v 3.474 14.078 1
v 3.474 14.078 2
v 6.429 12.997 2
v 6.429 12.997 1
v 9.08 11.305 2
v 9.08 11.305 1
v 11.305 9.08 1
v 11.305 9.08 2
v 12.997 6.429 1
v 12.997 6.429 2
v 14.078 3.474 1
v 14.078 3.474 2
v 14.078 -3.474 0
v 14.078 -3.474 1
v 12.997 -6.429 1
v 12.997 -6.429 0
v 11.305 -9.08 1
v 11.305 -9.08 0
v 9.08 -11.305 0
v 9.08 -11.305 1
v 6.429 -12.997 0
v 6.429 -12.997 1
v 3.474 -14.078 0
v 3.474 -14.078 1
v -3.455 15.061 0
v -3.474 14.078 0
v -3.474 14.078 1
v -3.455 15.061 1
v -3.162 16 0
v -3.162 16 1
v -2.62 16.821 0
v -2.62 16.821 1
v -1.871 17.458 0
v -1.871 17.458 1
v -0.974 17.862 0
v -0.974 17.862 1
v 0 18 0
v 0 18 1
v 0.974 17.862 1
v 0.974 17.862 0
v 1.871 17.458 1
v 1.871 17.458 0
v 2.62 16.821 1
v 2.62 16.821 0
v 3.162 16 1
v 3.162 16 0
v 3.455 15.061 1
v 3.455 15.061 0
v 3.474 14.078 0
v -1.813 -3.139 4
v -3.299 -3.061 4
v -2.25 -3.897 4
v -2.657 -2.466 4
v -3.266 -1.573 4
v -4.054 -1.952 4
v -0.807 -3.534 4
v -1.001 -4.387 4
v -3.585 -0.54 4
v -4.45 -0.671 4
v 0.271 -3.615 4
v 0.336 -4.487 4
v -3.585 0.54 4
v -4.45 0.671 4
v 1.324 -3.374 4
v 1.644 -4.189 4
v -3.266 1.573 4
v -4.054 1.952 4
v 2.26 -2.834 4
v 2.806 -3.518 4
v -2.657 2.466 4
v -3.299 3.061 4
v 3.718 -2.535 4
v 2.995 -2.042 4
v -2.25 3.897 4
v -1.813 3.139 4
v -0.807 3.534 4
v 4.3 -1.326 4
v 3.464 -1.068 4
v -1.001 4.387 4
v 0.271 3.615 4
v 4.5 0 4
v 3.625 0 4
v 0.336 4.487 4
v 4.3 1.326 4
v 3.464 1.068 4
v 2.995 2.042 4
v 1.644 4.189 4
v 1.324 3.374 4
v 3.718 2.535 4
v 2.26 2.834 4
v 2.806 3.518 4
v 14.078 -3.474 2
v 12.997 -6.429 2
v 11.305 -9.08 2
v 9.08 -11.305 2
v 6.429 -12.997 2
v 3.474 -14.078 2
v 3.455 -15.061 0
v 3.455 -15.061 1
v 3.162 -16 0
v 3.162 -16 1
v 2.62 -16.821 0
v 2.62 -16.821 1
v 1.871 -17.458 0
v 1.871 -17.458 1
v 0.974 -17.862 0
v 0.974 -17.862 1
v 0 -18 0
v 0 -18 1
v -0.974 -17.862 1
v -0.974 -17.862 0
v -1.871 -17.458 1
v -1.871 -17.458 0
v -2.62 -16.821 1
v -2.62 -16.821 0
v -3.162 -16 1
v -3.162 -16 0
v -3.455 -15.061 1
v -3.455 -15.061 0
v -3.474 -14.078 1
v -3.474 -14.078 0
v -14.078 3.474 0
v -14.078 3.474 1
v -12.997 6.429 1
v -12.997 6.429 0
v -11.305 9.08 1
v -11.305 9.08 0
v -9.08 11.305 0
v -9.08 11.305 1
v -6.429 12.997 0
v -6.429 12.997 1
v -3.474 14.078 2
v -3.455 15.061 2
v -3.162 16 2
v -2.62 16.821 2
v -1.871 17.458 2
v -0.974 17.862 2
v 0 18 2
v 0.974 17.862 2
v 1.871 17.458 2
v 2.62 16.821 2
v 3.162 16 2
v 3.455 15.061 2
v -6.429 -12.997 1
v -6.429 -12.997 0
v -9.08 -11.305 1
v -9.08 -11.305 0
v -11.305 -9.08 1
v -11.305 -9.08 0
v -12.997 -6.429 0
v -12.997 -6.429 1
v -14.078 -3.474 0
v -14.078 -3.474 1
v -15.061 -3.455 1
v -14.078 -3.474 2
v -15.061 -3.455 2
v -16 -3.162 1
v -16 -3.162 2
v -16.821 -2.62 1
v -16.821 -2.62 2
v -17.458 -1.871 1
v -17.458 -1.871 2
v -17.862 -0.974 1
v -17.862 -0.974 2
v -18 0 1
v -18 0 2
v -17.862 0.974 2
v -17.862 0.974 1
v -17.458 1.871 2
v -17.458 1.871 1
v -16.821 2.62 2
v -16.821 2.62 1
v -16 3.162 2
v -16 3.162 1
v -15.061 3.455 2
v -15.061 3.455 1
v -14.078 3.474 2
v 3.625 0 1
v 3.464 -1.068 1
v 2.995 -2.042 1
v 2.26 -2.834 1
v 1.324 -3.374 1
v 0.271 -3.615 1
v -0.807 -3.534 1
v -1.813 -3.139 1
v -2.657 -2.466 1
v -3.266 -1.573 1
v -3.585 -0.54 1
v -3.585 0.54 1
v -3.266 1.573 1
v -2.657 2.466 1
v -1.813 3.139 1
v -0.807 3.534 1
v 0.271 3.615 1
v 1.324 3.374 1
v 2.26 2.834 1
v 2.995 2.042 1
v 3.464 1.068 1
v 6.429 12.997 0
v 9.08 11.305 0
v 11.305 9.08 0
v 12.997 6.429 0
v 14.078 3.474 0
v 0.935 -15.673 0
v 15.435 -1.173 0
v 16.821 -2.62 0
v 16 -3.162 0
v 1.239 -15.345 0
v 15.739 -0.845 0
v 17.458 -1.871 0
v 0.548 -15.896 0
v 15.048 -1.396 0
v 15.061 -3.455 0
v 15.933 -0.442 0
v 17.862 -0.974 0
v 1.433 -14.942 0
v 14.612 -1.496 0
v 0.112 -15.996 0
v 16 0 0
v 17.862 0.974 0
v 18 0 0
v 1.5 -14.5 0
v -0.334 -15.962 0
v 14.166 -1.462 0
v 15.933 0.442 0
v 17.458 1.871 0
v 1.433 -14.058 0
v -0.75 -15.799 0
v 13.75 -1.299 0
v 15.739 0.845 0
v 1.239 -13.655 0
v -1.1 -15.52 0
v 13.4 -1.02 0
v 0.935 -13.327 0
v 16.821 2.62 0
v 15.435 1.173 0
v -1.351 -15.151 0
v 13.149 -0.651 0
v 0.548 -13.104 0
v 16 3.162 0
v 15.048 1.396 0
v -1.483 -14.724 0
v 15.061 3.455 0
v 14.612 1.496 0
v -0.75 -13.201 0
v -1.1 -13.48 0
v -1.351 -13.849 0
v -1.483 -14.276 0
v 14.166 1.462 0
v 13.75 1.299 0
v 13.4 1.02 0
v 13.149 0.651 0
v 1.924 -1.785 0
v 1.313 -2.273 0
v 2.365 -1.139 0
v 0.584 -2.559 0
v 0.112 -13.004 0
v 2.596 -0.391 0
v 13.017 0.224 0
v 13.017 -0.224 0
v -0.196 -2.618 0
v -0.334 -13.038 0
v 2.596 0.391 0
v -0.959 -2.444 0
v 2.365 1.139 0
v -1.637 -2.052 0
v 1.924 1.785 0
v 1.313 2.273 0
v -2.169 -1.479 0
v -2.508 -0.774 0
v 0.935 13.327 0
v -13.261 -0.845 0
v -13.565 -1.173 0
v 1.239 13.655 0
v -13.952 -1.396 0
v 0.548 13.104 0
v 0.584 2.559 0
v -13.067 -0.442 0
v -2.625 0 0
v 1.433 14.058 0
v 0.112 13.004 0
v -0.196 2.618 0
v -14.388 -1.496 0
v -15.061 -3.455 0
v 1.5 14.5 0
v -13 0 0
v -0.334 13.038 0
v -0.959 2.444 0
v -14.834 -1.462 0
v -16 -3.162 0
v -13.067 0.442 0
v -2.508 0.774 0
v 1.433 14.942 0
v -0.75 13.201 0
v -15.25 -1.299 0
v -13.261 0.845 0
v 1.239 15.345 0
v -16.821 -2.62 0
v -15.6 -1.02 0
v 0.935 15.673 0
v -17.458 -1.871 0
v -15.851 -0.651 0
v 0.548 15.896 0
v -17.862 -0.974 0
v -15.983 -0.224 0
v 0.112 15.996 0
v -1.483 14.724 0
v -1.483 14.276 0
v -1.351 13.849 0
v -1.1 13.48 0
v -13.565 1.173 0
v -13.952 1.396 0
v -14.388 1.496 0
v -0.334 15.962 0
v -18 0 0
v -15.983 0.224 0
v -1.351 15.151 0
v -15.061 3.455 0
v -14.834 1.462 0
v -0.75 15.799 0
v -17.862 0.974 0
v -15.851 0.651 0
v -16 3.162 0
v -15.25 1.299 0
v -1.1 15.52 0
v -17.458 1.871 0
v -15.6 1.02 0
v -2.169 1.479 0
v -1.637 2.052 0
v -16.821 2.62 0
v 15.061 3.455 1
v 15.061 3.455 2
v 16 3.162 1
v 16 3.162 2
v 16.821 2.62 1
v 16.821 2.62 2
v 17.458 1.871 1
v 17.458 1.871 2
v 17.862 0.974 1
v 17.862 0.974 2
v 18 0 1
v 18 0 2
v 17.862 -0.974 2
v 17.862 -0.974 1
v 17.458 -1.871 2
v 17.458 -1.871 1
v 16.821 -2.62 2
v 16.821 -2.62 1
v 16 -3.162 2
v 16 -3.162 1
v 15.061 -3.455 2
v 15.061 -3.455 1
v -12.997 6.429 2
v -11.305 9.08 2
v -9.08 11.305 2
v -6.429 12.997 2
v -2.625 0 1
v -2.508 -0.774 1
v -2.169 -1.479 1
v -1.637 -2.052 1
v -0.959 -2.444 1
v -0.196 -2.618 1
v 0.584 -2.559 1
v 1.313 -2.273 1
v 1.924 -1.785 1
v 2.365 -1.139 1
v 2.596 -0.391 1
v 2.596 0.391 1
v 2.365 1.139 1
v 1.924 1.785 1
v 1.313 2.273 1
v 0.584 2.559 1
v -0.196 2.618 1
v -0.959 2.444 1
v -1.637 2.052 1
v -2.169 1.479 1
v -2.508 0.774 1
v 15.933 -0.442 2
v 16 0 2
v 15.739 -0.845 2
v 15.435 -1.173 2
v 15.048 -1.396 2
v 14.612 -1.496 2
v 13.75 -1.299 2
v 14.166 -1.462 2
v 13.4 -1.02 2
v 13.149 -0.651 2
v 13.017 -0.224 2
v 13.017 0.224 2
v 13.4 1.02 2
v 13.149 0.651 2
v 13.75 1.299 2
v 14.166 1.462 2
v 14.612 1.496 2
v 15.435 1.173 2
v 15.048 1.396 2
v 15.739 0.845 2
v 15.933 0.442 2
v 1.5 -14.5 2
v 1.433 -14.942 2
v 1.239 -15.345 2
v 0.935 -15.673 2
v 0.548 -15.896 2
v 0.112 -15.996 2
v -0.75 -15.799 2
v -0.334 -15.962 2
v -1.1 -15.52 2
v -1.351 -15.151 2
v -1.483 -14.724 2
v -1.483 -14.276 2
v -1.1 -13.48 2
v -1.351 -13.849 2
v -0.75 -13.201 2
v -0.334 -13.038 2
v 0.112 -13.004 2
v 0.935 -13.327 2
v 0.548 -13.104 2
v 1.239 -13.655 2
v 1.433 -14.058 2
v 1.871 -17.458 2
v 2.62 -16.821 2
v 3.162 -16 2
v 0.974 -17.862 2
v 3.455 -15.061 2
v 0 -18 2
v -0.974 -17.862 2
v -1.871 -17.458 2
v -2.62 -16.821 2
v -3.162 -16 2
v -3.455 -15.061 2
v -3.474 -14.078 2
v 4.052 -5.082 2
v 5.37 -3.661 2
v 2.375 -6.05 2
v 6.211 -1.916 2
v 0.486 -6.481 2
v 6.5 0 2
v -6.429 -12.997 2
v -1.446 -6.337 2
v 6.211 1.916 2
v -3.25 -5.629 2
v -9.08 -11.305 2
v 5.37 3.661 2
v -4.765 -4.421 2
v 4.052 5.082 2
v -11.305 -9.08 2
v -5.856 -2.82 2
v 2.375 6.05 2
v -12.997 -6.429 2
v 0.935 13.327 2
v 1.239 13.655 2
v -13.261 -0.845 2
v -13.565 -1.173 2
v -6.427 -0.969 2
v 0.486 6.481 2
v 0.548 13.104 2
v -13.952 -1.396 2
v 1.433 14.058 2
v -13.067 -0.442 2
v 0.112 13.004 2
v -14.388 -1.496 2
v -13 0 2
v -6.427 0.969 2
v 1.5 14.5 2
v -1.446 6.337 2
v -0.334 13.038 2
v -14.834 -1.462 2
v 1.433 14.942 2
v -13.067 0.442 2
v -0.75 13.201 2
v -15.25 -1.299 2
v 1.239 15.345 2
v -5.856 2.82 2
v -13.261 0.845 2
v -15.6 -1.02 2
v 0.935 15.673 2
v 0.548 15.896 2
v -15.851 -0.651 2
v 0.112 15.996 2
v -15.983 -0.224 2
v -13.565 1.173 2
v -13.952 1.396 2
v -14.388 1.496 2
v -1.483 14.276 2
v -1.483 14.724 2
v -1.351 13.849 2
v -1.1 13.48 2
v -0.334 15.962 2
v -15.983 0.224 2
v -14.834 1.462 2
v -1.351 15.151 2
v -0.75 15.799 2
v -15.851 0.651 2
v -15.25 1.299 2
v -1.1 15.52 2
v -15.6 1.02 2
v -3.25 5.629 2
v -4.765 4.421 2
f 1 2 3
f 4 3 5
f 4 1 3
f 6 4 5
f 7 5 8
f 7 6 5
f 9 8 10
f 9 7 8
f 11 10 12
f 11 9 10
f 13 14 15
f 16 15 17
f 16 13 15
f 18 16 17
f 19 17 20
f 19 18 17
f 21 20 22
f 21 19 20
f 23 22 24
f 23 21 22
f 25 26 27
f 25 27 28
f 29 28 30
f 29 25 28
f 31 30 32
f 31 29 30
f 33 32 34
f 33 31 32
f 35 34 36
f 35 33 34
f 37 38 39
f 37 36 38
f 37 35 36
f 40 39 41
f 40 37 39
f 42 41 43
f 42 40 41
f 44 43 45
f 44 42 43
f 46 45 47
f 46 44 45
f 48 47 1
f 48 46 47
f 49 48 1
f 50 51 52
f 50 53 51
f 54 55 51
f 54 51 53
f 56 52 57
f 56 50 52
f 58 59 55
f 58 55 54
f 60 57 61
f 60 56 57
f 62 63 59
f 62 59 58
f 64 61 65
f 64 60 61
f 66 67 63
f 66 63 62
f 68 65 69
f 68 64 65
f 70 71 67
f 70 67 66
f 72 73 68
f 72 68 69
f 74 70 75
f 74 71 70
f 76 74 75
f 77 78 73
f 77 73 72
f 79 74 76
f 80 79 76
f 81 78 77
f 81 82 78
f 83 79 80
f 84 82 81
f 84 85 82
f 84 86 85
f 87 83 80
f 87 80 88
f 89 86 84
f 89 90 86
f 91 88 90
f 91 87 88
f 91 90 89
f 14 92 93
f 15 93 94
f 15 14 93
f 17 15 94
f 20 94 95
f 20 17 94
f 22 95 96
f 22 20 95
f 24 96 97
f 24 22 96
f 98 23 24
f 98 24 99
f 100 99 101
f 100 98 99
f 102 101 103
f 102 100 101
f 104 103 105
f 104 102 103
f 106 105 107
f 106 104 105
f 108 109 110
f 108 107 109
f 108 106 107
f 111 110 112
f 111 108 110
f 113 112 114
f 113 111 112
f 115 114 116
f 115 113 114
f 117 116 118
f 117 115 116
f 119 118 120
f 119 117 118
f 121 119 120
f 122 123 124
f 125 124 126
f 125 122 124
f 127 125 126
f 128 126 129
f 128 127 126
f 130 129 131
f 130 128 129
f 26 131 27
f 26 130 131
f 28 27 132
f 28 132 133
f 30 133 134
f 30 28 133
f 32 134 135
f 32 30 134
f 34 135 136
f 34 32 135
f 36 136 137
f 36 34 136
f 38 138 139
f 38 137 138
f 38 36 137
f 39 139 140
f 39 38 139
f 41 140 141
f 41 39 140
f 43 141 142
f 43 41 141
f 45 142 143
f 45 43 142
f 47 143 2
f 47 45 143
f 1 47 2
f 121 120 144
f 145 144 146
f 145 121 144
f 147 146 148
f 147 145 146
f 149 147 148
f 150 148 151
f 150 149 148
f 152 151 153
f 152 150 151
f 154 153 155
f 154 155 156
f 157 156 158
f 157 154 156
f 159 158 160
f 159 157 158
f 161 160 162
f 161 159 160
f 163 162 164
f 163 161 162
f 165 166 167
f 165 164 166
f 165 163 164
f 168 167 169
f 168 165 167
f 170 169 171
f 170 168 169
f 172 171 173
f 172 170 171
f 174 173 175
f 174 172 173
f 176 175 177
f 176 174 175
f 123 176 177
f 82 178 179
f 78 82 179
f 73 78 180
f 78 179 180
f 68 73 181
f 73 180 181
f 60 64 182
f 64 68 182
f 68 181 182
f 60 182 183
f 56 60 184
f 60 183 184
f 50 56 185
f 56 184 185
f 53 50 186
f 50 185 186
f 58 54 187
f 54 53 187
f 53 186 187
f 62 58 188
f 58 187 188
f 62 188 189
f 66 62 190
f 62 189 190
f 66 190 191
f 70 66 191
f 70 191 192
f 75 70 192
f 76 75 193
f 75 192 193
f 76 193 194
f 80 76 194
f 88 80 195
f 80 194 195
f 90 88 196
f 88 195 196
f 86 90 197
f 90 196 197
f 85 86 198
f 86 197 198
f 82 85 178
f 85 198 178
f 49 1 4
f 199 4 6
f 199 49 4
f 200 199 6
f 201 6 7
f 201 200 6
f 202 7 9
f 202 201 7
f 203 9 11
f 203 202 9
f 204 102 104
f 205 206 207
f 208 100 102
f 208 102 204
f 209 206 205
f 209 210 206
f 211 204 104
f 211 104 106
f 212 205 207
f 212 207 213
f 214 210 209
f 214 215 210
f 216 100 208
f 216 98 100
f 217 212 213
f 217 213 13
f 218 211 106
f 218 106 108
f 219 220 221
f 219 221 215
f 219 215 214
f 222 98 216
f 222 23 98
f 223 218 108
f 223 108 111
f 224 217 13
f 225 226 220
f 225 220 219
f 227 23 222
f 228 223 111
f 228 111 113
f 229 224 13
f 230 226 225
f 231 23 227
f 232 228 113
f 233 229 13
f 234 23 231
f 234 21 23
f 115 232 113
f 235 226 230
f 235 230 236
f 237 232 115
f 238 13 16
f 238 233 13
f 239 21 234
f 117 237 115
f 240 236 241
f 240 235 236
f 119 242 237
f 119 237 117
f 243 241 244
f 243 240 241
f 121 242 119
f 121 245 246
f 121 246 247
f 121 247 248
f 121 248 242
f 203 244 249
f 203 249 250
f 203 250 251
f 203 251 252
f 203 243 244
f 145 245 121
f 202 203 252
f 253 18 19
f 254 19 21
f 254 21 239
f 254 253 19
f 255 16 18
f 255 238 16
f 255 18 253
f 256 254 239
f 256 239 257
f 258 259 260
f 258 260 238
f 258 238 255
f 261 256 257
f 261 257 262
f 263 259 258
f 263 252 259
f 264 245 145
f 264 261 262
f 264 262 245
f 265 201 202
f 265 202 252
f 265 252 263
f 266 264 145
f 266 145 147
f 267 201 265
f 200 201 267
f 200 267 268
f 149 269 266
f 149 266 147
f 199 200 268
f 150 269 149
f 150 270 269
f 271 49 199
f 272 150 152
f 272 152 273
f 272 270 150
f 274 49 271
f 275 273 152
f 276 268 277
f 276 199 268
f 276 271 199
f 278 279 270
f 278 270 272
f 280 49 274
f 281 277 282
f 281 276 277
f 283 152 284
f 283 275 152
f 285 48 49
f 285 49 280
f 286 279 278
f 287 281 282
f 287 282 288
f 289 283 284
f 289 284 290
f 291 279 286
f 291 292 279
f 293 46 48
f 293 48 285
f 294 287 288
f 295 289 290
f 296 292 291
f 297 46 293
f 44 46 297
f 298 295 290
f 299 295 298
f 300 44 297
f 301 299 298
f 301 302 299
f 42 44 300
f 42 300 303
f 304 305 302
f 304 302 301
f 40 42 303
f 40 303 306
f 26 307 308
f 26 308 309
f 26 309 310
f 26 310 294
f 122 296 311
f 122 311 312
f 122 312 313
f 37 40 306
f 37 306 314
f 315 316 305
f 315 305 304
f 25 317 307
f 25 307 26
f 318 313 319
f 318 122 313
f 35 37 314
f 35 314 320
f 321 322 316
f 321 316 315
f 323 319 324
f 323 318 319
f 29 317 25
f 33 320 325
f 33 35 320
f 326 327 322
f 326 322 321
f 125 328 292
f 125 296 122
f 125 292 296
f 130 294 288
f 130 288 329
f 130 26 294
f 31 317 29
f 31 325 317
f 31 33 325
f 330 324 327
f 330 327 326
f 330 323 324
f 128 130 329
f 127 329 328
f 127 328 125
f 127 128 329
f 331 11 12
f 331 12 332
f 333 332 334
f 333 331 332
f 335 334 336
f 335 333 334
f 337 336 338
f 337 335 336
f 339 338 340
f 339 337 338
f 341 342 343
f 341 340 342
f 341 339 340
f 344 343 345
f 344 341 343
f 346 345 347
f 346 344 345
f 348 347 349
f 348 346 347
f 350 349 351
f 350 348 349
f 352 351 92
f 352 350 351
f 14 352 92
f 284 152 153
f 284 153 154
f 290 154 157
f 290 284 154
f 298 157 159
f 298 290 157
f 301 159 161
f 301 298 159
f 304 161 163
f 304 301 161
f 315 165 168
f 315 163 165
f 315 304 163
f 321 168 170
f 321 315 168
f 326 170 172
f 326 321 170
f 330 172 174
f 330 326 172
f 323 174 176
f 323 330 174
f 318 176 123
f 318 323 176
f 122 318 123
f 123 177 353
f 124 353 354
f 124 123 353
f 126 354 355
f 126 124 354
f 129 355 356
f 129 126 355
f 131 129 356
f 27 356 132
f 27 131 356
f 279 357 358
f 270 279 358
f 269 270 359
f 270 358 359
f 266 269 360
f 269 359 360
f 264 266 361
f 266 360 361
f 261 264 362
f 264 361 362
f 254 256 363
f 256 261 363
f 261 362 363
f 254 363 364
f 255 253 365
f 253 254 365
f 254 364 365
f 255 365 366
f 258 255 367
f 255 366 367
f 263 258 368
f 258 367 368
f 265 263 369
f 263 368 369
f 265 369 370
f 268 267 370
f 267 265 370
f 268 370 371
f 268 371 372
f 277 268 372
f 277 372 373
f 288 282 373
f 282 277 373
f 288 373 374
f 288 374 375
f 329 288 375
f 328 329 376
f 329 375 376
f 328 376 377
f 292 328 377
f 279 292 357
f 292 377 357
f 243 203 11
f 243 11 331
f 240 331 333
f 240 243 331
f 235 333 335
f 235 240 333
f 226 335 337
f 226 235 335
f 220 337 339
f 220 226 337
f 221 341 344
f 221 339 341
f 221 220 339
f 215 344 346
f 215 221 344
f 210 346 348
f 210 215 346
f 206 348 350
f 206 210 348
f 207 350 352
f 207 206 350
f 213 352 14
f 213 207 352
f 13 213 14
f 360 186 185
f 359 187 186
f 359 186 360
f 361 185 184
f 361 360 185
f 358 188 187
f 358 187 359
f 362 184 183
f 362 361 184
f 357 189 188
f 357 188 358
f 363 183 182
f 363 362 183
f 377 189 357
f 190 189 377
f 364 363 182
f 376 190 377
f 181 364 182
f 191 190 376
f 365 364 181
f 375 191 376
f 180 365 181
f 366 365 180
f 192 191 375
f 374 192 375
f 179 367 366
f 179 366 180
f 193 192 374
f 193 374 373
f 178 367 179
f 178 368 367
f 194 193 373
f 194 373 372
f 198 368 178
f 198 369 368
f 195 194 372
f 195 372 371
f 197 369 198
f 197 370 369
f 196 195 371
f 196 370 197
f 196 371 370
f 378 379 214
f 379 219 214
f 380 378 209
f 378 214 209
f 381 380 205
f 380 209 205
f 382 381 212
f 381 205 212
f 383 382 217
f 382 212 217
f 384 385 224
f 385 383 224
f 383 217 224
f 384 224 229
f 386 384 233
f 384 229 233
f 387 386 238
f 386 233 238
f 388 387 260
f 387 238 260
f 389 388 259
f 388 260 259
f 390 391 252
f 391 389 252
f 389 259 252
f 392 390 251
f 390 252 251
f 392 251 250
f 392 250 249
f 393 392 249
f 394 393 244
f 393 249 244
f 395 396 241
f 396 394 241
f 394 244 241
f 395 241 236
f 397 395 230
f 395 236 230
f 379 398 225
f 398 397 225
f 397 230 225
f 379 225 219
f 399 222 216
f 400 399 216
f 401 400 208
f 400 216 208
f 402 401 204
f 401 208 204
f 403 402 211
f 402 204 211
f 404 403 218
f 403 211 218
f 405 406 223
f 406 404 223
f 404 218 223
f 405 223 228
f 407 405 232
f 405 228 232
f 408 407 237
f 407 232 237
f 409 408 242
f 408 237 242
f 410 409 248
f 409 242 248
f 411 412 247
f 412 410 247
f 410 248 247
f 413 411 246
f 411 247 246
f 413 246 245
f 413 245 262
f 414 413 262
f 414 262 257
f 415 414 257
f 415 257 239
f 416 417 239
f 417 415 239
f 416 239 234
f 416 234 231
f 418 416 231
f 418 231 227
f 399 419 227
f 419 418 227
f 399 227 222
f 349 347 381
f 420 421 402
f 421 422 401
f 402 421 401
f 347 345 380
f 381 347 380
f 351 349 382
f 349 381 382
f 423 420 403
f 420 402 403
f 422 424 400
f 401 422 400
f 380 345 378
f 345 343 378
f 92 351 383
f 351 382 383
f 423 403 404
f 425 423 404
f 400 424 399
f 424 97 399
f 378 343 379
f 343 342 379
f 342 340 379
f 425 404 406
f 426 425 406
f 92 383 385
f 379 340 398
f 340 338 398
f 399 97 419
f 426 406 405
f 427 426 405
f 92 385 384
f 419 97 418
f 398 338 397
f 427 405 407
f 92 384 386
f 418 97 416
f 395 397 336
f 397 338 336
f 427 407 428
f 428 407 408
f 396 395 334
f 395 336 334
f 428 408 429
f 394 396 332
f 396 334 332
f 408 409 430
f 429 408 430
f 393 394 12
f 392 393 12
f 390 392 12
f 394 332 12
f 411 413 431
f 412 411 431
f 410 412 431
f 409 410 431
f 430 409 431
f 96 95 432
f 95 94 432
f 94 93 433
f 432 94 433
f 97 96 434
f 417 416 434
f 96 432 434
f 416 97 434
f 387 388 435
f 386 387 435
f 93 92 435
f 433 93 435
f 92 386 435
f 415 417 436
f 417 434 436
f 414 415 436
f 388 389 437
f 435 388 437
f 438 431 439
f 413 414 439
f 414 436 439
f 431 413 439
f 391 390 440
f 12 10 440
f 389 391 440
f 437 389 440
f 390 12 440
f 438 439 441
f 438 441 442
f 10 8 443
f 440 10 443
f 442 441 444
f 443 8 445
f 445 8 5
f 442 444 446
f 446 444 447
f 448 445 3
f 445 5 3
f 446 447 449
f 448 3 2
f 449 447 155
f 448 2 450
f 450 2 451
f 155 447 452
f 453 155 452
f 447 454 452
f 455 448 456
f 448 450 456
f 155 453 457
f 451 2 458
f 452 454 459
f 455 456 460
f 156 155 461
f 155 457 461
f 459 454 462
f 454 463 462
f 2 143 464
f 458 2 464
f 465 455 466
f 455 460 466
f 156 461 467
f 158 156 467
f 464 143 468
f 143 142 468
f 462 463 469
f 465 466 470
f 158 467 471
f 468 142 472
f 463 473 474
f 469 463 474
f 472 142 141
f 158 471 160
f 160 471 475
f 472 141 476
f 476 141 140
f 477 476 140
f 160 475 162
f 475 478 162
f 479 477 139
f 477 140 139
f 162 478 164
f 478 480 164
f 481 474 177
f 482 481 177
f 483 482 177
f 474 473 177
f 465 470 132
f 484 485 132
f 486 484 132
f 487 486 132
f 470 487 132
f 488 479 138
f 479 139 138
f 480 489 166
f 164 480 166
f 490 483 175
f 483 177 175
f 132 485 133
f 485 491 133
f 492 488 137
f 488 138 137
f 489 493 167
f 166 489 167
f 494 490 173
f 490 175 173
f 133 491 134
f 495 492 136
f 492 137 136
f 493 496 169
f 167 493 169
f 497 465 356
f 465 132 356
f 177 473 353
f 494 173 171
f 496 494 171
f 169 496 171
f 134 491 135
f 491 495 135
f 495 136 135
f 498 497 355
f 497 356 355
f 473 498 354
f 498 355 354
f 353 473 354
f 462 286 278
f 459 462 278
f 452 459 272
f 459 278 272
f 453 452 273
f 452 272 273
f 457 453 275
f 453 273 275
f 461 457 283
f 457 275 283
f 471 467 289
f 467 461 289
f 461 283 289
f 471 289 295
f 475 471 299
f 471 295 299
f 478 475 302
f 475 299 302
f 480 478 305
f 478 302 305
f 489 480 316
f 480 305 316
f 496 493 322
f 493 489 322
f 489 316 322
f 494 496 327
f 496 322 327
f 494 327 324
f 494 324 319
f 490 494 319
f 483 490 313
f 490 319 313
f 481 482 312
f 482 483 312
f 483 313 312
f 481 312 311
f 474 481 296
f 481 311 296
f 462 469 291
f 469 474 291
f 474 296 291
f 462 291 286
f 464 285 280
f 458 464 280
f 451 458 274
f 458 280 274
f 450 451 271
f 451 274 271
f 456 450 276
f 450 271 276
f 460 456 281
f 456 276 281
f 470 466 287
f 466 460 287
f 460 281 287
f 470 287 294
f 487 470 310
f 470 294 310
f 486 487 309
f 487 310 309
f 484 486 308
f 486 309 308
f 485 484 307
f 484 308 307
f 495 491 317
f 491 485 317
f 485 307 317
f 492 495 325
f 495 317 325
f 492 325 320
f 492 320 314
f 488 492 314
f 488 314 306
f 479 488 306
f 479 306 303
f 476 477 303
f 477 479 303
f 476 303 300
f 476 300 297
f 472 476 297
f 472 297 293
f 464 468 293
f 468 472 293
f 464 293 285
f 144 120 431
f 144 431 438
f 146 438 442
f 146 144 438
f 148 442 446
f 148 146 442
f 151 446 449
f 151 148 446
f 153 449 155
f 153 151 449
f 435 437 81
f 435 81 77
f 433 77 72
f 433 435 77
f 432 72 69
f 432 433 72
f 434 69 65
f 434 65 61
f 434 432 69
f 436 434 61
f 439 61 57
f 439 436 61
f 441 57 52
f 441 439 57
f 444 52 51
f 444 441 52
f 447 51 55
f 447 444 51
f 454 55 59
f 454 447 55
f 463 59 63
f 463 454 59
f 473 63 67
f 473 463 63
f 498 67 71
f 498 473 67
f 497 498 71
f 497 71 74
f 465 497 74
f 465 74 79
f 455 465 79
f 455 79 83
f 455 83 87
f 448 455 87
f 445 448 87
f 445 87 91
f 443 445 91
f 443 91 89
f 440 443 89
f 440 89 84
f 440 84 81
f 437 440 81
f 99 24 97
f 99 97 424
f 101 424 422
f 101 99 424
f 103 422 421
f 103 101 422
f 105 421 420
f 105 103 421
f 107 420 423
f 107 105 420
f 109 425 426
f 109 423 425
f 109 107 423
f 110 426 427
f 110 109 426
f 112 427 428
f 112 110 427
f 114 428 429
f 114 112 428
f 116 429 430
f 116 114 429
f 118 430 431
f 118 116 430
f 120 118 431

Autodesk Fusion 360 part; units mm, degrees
sketch "Sketch1" plane through (0, 0, 0) normal (0, 0, 1) x (1, 0, 0)
  circle A0 centre (0, 0) radius 11
  circle A1 centre (0, 0) radius 12.5
  circle A2 centre (0, 0) radius 14.5
  line L0 (0, 0) -> (0, 14.5)
  line L1 (0, 0) -> (14.5, 0)
  line L2 (0, 0) -> (-14.5, 0)
  line L3 (0, 0) -> (0, -14.5)
  circle A3 centre (0, 14.5) radius 3.5
  circle A4 centre (14.5, 0) radius 3.5
  circle A5 centre (0, -14.5) radius 3.5
  circle A6 centre (-14.5, 0) radius 3.5
  circle A7 centre (-14.5, 0) radius 1.5
  circle A8 centre (0, 14.5) radius 1.5
  circle A9 centre (14.5, 0) radius 1.5
  circle A10 centre (0, -14.5) radius 1.5
  dimension "d1" = 22
  dimension "d2" = 25
  dimension "d3" = 29
  dimension "d4" = 7
  dimension "d5" = 3
  dimension "d6" = 3
  dimension "d7" = 3
  dimension "d8" = 3
extrude "Extrude1" add sketch "Sketch1" along normal blind 1 contours A0 A1 A4 A5 | A1 L1 A4 | A0 A1 A3 A4 | A1 L1 A4 | A1 L0 A3 | A0 A1 A3 A6 | A1 L0 A3 | A0 A1 A5 A6 | A1 L3 A5 | A1 L3 A5 | A1 A2 L1 A4 A9 | A1 A2 L1 A4 A9 | A1 A2 A3 A4 | A1 A2 A4 A5 | A1 L2 A6 | A1 L2 A6 | A1 A2 L0 A3 A8 | A1 A2 L0 A3 A8 | A1 A2 A3 A6 | A1 A2 L3 A5 A10 | A1 A2 L3 A5 A10 | A1 A2 A5 A6 | A2 A4 A9 | A1 A2 L2 A6 A7 | A1 A2 L2 A6 A7 | A2 A3 A8 | A2 A5 A10 | A2 A6 A7
sketch "Sketch2" plane through (0, 0, 1) normal (0, 0, 1) x (1, 0, 0)
  circle A0 centre (0, -14.5) radius 1.5
  circle A1 centre (14.5, 0) radius 1.5
  circle A2 centre (-14.5, 0) radius 1.5
  circle A3 centre (0, 14.5) radius 1.5
  circle A4 centre (0, 0) radius 11
  arc A5 (-3.4744, 14.0776) -> (-14.0776, 3.4744) centre (0, 0) ccw
  arc A6 (-14.0776, 3.4744) -> (-14.0776, -3.4744) centre (-14.5, 0) ccw
  arc A7 (-14.0776, -3.4744) -> (-3.4744, -14.0776) centre (0, 0) ccw
  arc A8 (-3.4744, -14.0776) -> (3.4744, -14.0776) centre (0, -14.5) ccw
  arc A9 (3.4744, -14.0776) -> (14.0776, -3.4744) centre (0, 0) ccw
  arc A10 (14.0776, -3.4744) -> (14.0776, 3.4744) centre (14.5, 0) ccw
  arc A11 (14.0776, 3.4744) -> (3.4744, 14.0776) centre (0, 0) ccw
  arc A12 (3.4744, 14.0776) -> (-3.4744, 14.0776) centre (0, 14.5) ccw
  circle A13 centre (0, 0) radius 11
  circle A14 centre (0, 0) radius 12.375
  circle A15 centre (0, 0) radius 14.5
  circle A16 centre (0, 14.5) radius 3.5
  circle A17 centre (14.5, 0) radius 3.5
  circle A18 centre (0, -14.5) radius 3.5
  circle A19 centre (-14.5, 0) radius 3.5
  dimension "d11" = 24.75
extrude "Extrude2" add sketch "Sketch2" along normal blind 1.25 contours A0 A8 A15 A18 | A0 A14 A15 A18 | A9 A14 A15 A17 A18 | A7 A14 A15 A18 A19 | A1 A10 A15 A17 | A1 A14 A15 A17 | A2 A6 A15 A19 | A2 A14 A15 A19 | A5 A14 A15 A16 A19 | A11 A14 A15 A16 A17 | A3 A12 A15 A16 | A3 A14 A15 A16
extrude "Extrude3" cut 1 faces at (-2.5265, -13.3305, 2.25) along direction (0, 0, -1) blind 1.25
sketch "Sketch3" plane through (0, 0, 1) normal (0, 0, 1) x (1, 0, 0)
  arc A0 (-3.4744, 14.0776) -> (-14.0776, 3.4744) centre (0, 0) ccw
  arc A1 (-14.0776, 3.4744) -> (-14.0776, -3.4744) centre (-14.5, 0) ccw
  arc A2 (-14.0776, -3.4744) -> (-3.4744, -14.0776) centre (0, 0) ccw
  arc A3 (-3.4744, -14.0776) -> (3.4744, -14.0776) centre (0, -14.5) ccw
  arc A4 (3.4744, -14.0776) -> (14.0776, -3.4744) centre (0, 0) ccw
  arc A5 (14.0776, -3.4744) -> (14.0776, 3.4744) centre (14.5, 0) ccw
  arc A6 (14.0776, 3.4744) -> (3.4744, 14.0776) centre (0, 0) ccw
  arc A7 (3.4744, 14.0776) -> (-3.4744, 14.0776) centre (0, 14.5) ccw
  circle A8 centre (0, 14.5) radius 1.5
  circle A9 centre (14.5, 0) radius 1.5
  circle A10 centre (-14.5, 0) radius 1.5
  circle A11 centre (0, -14.5) radius 1.5
  circle A12 centre (0, 0) radius 11
  circle A13 centre (0, 0) radius 3.05
  dimension "d16" = 6.1
extrude "Extrude4" add sketch "Sketch3" along normal blind 2 contours A0 A1 A2 A3 A4 A5 A6 A7 | A12
sketch "Sketch4" plane through (0, 0, 3) normal (0, 0, 1) x (1, 0, 0)
  circle A0 centre (-14.5, 0) radius 1.5
  circle A1 centre (0, 14.5) radius 1.5
  circle A2 centre (0, 0) radius 3.05
  circle A3 centre (0, -14.5) radius 1.5
  circle A4 centre (14.5, 0) radius 1.5
  arc A5 (3.4744, 14.0776) -> (-3.4744, 14.0776) centre (0, 14.5) ccw
  arc A6 (-3.4744, 14.0776) -> (-14.0776, 3.4744) centre (0, 0) ccw
  arc A7 (-14.0776, 3.4744) -> (-14.0776, -3.4744) centre (-14.5, 0) ccw
  arc A8 (-14.0776, -3.4744) -> (-3.4744, -14.0776) centre (0, 0) ccw
  arc A9 (-3.4744, -14.0776) -> (3.4744, -14.0776) centre (0, -14.5) ccw
  arc A10 (3.4744, -14.0776) -> (14.0776, -3.4744) centre (0, 0) ccw
  arc A11 (14.0776, -3.4744) -> (14.0776, 3.4744) centre (14.5, 0) ccw
  arc A12 (14.0776, 3.4744) -> (3.4744, 14.0776) centre (0, 0) ccw
  circle A13 centre (0, 0) radius 1.5
  dimension "d19" = 3
extrude "Extrude5" cut sketch "Sketch4" against normal blind 1 contours A5 A6 A7 A8 A9 A10 A11 A12
sketch "Sketch5" plane through (0, 0, 1) normal (0, 0, -1) x (-1, 0, 0)
  circle A0 centre (0, 0) radius 3.05
  circle A1 centre (0, 0) radius 11
  circle A2 centre (0, 0) radius 1.5
  dimension "d22" = 3
extrude "Extrude6" add sketch "Sketch5" against normal blind 1 contours A0
sketch "Sketch6" plane through (0, 0, 1) normal (0, 0, -1) x (-1, 0, 0)
  circle A0 centre (0, 0) radius 1.5
  circle A1 centre (0, 0) radius 11
  circle A2 centre (0, 0) radius 2.5
  dimension "d25" = 5
extrude "Extrude7" cut sketch "Sketch6" against normal blind 2 contours A2
sketch "Sketch7" plane through (0, 0, 1) normal (0, 0, -1) x (-1, 0, 0)
  circle A0 centre (0, 0) radius 2.5
  circle A1 centre (0, 0) radius 11
  circle A2 centre (0, 0) radius 5
  dimension "d28" = 10
extrude "Extrude8" cut sketch "Sketch7" against normal blind 4 contours A2
sketch "Sketch8" plane through (0, 0, 1) normal (0, 0, -1) x (-1, 0, 0)
  circle A0 centre (0, 0) radius 5
  circle A1 centre (0, 0) radius 11
  circle A2 centre (0, 0) radius 3.55
  dimension "d31" = 7.1
extrude "Extrude9" add sketch "Sketch8" against normal blind 1 contours A0
sketch "Sketch9" plane through (0, 0, 1) normal (0, 0, -1) x (-1, 0, 0)
  circle A0 centre (0, 0) radius 3.55
  circle A1 centre (0, 0) radius 11
  circle A2 centre (0, 0) radius 2.625
  dimension "d35" = 5.25
extrude "Extrude10" add sketch "Sketch9" along normal blind 1 contours A0 | A1
sketch "Sketch10" plane through (0, 0, 2) normal (0, 0, 1) x (1, 0, 0)
  circle A0 centre (0, 0) radius 3.55
  circle A1 centre (0, -14.5) radius 1.5
  circle A2 centre (14.5, 0) radius 1.5
  circle A3 centre (0, 14.5) radius 1.5
  circle A4 centre (-14.5, 0) radius 1.5
  arc A5 (14.0776, 3.4744) -> (3.4744, 14.0776) centre (0, 0) ccw
  arc A6 (3.4744, 14.0776) -> (-3.4744, 14.0776) centre (0, 14.5) ccw
  arc A7 (-3.4744, 14.0776) -> (-14.0776, 3.4744) centre (0, 0) ccw
  arc A8 (-14.0776, 3.4744) -> (-14.0776, -3.4744) centre (-14.5, 0) ccw
  arc A9 (-14.0776, -3.4744) -> (-3.4744, -14.0776) centre (0, 0) ccw
  arc A10 (-3.4744, -14.0776) -> (3.4744, -14.0776) centre (0, -14.5) ccw
  arc A11 (3.4744, -14.0776) -> (14.0776, -3.4744) centre (0, 0) ccw
  arc A12 (14.0776, -3.4744) -> (14.0776, 3.4744) centre (14.5, 0) ccw
  circle A13 centre (0, 0) radius 3.55
  circle A14 centre (0, 0) radius 4.5
  dimension "d38" = 9
extrude "Extrude11" add sketch "Sketch10" along normal blind 1 contours A14
chamfer "Chamfer1" distance 1 angle 45 1 edges at (-4.1955, 1.6273, 2)
sketch "Sketch11" plane through (0, 0, 3) normal (0, 0, 1) x (1, 0, 0)
  circle A0 centre (0, 0) radius 3.55
  circle A1 centre (0, 0) radius 4.5
  circle A2 centre (0, 0) radius 3.625
  dimension "d42" = 7.25
extrude "Extrude12" cut sketch "Sketch11" against normal blind 2 contours A2
extrude "Extrude13" add 1 faces at (4.1916, -0.2236, 3) along direction (0, 0, 1) blind 1
delete_face "DeleteFace1" 1 faces at (5.1409, -0.5144, 2.3333)
chamfer "Chamfer2" distance 2 angle 45 1 edges at (-4.1955, 1.6273, 2)
